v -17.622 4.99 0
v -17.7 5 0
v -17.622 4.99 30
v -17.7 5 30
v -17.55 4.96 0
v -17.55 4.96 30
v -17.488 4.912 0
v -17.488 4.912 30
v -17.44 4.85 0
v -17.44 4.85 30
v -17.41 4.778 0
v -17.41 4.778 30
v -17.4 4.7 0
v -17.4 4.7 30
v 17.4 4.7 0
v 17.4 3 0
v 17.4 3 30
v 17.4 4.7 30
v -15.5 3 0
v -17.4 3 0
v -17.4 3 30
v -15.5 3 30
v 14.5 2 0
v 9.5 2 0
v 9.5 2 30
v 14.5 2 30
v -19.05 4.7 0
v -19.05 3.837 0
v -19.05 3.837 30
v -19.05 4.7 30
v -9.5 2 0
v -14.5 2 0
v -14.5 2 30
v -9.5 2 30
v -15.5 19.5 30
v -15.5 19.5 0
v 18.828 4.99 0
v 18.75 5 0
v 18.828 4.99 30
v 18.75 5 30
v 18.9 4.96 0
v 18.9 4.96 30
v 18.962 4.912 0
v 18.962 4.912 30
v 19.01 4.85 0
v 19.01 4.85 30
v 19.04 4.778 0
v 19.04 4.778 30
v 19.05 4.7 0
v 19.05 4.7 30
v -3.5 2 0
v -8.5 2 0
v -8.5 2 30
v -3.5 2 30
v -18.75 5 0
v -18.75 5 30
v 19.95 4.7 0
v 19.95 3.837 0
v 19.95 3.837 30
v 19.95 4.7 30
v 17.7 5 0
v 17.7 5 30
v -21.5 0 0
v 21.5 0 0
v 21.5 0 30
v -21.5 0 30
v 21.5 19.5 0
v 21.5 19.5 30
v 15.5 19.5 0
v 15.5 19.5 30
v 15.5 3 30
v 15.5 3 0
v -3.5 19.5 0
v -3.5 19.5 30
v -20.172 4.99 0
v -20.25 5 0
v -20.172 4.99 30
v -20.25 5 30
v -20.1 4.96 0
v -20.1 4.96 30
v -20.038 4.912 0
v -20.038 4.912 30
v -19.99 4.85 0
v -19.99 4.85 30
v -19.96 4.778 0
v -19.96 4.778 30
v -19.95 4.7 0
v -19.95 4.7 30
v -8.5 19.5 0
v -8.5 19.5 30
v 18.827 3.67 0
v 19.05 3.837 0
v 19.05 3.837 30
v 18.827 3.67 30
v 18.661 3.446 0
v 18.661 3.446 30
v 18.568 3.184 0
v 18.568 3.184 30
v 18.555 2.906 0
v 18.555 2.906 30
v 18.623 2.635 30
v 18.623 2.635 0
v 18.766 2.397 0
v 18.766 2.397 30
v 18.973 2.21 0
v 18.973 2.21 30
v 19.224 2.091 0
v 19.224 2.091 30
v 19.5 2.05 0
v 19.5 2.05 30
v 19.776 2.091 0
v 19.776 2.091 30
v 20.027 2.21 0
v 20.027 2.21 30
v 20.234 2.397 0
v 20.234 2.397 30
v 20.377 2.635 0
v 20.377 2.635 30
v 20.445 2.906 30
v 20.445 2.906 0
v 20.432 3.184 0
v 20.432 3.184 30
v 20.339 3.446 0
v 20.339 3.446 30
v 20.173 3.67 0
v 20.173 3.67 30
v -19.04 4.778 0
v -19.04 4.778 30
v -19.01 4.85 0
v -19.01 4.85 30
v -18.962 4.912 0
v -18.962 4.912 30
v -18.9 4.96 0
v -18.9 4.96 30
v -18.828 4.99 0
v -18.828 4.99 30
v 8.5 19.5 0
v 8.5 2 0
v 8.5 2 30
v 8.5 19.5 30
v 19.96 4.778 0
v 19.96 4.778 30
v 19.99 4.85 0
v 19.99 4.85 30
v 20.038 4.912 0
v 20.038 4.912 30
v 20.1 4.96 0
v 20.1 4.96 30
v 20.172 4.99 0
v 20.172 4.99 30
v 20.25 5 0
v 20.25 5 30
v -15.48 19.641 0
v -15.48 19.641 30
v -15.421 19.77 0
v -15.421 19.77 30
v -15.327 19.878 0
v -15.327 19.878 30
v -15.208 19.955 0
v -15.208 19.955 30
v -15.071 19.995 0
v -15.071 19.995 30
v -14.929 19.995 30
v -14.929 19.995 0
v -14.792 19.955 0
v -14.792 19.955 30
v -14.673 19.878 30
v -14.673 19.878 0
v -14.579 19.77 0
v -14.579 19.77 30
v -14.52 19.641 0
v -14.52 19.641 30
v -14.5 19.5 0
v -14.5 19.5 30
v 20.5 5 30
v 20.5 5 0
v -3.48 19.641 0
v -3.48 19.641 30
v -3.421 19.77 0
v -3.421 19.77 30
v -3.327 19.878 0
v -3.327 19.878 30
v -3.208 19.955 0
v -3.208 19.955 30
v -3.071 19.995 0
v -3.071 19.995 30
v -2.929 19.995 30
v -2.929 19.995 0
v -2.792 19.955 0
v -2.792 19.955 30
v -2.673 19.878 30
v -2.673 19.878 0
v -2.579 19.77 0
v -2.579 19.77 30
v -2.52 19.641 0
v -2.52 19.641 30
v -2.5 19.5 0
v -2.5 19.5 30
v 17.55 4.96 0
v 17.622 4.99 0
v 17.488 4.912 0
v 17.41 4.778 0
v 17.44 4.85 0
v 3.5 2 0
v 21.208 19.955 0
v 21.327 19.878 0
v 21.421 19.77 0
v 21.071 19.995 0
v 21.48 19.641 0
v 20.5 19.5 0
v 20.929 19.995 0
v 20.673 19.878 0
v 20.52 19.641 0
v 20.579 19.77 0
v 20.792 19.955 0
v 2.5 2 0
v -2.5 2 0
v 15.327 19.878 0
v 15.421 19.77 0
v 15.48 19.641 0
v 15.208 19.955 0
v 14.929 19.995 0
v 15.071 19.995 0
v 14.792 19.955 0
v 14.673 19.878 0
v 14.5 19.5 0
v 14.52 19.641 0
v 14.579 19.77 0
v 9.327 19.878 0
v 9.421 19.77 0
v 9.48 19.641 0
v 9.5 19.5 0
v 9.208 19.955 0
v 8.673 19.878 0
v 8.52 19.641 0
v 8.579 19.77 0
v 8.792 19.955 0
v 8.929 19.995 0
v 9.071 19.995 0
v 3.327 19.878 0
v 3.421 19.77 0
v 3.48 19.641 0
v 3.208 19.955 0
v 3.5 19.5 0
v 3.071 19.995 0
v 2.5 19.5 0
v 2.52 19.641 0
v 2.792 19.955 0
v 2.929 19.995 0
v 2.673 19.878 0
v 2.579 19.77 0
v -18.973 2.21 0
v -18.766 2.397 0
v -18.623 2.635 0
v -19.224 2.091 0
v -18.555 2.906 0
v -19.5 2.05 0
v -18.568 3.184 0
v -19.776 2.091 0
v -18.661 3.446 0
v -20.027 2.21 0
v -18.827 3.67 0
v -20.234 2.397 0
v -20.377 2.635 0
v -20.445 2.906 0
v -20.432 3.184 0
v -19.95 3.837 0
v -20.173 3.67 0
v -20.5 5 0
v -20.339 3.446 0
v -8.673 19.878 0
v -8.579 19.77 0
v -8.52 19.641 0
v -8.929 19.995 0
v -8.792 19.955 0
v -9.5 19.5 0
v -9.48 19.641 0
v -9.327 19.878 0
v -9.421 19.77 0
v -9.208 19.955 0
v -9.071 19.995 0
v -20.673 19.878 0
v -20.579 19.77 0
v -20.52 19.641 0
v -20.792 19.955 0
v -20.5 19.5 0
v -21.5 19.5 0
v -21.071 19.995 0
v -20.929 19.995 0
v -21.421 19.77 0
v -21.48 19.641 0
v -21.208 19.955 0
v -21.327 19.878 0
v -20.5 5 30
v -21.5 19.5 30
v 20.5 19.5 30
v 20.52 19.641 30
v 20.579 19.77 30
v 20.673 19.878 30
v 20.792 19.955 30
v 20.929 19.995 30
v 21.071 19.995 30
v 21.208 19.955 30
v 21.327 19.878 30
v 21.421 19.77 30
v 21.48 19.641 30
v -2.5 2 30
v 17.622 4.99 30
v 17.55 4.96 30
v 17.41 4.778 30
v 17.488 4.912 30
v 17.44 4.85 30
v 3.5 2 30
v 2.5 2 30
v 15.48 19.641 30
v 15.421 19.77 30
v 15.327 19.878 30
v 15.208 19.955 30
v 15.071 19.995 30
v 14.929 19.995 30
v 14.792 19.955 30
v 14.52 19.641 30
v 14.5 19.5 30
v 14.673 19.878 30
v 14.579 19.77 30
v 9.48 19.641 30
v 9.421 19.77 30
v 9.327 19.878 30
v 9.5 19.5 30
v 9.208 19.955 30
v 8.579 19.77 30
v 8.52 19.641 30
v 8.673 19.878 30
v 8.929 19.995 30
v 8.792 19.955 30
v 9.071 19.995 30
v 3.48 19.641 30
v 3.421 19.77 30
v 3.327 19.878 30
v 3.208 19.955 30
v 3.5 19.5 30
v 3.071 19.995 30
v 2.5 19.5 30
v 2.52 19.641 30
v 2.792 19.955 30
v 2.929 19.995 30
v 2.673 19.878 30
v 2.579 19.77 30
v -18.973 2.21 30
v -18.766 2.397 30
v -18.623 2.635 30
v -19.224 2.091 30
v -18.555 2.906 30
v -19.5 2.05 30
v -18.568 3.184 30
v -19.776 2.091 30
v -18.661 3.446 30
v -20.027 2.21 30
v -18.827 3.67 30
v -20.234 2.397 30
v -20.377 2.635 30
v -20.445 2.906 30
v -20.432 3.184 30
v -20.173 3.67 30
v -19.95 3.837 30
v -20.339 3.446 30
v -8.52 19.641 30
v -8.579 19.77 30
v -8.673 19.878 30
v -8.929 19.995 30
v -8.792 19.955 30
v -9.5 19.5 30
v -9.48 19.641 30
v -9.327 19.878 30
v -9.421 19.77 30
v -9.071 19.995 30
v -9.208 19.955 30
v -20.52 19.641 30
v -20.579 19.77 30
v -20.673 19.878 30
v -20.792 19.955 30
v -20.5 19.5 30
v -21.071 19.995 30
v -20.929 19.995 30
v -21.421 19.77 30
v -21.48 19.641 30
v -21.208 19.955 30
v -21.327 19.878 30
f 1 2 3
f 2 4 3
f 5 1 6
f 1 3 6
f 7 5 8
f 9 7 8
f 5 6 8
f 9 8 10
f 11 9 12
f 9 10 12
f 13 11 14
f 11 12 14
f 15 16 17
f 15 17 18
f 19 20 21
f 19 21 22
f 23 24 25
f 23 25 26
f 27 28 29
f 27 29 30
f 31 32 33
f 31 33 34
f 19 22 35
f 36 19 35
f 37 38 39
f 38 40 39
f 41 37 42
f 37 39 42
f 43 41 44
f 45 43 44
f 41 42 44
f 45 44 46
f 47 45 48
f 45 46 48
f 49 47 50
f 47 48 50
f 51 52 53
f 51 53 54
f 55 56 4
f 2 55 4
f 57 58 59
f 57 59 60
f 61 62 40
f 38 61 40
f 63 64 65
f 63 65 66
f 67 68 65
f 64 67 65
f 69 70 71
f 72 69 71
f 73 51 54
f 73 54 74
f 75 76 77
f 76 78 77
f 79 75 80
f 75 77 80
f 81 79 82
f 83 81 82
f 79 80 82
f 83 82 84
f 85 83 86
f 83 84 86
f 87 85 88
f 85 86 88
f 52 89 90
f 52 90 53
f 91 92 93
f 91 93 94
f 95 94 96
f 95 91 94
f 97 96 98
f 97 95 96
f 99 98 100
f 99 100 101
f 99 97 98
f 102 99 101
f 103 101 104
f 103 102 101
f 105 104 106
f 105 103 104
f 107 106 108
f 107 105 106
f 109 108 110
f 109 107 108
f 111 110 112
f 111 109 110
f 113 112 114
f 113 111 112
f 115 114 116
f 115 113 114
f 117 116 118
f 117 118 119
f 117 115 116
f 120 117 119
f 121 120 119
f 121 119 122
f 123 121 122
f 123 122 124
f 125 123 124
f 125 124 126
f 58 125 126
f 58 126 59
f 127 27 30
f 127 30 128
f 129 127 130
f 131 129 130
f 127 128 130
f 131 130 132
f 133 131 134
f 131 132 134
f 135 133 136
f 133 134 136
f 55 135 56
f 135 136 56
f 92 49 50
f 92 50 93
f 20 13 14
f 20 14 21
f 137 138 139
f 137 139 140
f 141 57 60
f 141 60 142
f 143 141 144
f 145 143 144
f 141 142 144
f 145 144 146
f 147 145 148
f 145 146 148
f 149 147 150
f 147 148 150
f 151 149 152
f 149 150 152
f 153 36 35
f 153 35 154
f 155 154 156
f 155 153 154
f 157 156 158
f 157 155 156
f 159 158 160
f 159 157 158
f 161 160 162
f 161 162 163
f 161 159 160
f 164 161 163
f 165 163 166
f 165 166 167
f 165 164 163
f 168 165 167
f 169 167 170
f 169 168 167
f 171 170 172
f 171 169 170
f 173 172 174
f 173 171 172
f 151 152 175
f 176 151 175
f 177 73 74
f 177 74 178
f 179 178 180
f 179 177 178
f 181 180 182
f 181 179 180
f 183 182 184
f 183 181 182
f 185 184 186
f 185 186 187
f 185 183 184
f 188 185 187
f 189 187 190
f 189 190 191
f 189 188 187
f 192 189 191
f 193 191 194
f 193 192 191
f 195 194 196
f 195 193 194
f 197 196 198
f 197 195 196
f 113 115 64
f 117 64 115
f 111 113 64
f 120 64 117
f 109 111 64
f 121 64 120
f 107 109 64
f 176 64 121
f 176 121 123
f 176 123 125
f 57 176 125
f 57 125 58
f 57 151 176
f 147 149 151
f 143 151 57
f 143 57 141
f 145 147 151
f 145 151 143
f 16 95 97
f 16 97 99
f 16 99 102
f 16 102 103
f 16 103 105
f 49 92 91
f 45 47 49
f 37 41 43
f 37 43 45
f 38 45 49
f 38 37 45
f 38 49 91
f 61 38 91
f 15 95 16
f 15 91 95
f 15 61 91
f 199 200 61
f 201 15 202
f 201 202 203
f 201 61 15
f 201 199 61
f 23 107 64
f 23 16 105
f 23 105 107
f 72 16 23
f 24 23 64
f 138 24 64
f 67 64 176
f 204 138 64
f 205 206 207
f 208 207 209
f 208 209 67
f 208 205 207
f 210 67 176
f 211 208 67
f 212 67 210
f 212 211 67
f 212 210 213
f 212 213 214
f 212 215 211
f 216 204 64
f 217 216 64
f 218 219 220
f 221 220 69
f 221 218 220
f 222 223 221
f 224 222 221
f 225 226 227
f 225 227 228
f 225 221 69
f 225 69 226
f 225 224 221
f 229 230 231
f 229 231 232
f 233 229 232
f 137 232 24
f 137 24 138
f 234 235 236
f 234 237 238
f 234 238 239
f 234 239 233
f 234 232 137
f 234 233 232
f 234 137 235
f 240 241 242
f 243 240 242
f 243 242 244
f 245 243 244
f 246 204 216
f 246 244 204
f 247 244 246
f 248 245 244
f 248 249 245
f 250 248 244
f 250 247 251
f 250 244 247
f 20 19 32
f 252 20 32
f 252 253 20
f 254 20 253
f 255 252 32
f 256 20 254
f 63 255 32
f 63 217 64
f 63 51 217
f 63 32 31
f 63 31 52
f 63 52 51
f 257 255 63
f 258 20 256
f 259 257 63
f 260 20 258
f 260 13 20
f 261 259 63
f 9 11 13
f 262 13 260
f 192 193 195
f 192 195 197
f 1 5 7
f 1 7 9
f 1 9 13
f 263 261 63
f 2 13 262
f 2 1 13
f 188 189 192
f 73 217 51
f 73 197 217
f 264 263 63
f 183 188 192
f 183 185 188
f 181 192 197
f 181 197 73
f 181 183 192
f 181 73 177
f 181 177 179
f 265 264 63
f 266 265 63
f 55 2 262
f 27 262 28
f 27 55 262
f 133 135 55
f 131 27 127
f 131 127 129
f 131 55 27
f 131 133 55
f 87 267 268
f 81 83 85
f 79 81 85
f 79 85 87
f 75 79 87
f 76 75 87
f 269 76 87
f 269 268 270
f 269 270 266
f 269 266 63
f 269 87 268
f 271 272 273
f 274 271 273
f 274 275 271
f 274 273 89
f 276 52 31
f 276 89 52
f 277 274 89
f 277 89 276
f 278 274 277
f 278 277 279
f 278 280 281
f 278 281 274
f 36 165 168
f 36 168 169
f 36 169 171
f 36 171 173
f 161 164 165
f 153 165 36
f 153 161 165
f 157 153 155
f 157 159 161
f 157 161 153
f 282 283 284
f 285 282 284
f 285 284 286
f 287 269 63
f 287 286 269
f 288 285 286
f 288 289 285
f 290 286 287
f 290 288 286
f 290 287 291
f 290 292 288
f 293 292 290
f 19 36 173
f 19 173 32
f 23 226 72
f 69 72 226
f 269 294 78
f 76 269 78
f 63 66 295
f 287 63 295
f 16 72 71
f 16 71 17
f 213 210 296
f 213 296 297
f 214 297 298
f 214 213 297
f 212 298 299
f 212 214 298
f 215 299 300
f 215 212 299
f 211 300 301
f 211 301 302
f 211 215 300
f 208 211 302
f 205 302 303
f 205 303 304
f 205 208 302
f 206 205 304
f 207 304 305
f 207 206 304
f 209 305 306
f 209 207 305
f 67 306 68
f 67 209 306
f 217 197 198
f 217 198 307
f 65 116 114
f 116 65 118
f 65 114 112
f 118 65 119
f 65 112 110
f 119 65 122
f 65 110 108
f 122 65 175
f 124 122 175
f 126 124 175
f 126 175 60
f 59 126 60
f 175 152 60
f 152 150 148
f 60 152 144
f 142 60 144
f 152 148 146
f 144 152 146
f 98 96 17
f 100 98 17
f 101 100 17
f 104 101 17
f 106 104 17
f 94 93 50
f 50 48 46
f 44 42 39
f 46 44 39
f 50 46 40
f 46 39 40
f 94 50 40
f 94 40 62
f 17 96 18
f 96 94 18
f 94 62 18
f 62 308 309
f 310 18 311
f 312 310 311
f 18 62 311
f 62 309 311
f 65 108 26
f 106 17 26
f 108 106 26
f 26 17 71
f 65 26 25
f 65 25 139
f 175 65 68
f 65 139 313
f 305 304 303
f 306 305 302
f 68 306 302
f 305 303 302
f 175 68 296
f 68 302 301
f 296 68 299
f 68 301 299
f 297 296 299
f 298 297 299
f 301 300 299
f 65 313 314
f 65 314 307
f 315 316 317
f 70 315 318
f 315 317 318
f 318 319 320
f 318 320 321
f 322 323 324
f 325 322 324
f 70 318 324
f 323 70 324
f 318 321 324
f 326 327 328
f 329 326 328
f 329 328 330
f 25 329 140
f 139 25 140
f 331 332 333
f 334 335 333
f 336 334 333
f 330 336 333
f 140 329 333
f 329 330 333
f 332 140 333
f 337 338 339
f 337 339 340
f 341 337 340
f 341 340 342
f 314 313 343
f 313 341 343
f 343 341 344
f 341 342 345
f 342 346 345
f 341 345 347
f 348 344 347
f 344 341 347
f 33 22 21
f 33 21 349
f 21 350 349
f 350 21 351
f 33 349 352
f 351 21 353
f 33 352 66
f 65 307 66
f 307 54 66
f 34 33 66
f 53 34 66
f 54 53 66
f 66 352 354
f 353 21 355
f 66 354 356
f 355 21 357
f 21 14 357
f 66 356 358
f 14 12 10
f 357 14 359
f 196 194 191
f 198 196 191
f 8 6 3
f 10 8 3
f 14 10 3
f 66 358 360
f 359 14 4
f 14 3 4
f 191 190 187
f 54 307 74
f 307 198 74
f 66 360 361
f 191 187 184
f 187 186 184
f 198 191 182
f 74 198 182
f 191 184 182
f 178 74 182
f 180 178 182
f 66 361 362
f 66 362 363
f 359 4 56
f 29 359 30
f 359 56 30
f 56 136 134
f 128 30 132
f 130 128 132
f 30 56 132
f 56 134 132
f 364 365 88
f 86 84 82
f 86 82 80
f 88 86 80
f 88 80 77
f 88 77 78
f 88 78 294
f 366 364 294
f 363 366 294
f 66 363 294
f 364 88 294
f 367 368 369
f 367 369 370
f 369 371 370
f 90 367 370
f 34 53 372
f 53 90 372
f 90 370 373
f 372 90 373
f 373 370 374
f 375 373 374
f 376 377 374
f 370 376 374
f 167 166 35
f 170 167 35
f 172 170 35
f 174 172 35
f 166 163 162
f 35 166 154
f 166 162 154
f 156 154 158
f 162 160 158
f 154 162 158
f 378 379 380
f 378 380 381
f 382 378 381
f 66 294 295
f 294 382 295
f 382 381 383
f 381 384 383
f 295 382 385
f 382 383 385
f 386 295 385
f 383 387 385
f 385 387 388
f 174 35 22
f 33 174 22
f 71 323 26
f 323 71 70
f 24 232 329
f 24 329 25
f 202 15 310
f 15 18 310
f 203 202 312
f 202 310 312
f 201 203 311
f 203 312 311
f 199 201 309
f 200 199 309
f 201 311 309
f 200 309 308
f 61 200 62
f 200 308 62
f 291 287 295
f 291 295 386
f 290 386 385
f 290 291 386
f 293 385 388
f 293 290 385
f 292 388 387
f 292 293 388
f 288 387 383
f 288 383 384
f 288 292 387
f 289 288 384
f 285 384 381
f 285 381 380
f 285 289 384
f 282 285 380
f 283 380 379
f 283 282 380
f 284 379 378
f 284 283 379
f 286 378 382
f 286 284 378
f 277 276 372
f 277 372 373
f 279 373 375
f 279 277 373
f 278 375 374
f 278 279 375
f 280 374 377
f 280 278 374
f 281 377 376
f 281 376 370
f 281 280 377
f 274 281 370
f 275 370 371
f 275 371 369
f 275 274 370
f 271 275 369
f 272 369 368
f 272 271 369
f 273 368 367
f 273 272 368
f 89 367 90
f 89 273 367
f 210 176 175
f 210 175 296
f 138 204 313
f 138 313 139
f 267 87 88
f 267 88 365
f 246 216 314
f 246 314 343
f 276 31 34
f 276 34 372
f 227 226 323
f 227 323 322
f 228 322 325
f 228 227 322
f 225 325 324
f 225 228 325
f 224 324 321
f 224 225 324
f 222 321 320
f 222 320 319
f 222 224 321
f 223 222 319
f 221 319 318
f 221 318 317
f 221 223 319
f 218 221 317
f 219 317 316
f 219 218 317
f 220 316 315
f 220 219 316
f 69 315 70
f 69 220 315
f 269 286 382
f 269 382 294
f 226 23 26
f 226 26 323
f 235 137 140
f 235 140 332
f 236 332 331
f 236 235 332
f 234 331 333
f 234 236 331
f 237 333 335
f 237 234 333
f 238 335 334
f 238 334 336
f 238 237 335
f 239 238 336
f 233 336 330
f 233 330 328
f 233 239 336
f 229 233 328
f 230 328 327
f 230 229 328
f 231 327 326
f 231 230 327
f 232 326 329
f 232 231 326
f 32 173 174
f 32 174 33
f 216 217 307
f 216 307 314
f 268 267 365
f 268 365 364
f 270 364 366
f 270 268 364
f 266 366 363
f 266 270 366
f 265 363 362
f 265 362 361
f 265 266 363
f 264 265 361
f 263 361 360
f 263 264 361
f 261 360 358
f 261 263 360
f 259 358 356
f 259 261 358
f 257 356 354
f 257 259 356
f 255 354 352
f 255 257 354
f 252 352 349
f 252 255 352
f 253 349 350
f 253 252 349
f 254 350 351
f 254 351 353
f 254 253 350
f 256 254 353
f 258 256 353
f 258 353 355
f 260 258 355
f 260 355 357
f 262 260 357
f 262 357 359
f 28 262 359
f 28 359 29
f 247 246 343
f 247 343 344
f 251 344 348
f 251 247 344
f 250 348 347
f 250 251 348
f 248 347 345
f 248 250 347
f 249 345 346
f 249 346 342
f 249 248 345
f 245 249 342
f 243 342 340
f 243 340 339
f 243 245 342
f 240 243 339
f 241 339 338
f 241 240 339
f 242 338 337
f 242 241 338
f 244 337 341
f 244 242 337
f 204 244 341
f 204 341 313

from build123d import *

# Parameters (mm, degrees)
EXTRUDE_1_DEPTH = 30
FILLET_1_R      = 0.3


with BuildPart() as part:
    # Эскиз1 → Бобышка-Вытянуть1 (new body)
    with BuildSketch(Plane.XY):
        with BuildLine():
            Line((21.5, 0), (-21.5, 0))
            Line((-21.5, 0), (-21.5, 19.5))
            ThreePointArc((-21.5, 19.5), (-21, 20), (-20.5, 19.5))
            Line((-20.5, 19.5), (-20.5, 5))
            Line((-20.5, 5), (-19.95, 5))
            Line((-19.95, 5), (-19.95, 3.836660027))
            ThreePointArc((-19.95, 3.836660027), (-19.5, 2.05), (-19.05, 3.836660027))
            Line((-19.05, 3.836660027), (-19.05, 5))
            Line((-19.05, 5), (-17.4, 5))
            Line((-17.4, 5), (-17.4, 3))
            Line((-17.4, 3), (-15.5, 3))
            Line((-15.5, 3), (-15.5, 19.5))
            ThreePointArc((-15.5, 19.5), (-15, 20), (-14.5, 19.5))
            Line((-14.5, 19.5), (-14.5, 2))
            Line((-14.5, 2), (-9.5, 2))
            Line((-9.5, 2), (-9.5, 19.5))
            ThreePointArc((-9.5, 19.5), (-9, 20), (-8.5, 19.5))
            Line((-8.5, 19.5), (-8.5, 2))
            Line((-8.5, 2), (-3.5, 2))
            Line((-3.5, 2), (-3.5, 19.5))
            ThreePointArc((-3.5, 19.5), (-3, 20), (-2.5, 19.5))
            Line((-2.5, 19.5), (-2.5, 2))
            Line((-2.5, 2), (2.5, 2))
            Line((2.5, 2), (2.5, 19.5))
            ThreePointArc((2.5, 19.5), (3, 20), (3.5, 19.5))
            Line((3.5, 19.5), (3.5, 2))
            Line((3.5, 2), (8.5, 2))
            Line((8.5, 2), (8.5, 19.5))
            ThreePointArc((8.5, 19.5), (9, 20), (9.5, 19.5))
            Line((9.5, 19.5), (9.5, 2))
            Line((9.5, 2), (14.5, 2))
            Line((14.5, 2), (14.5, 19.5))
            ThreePointArc((14.5, 19.5), (15, 20), (15.5, 19.5))
            Line((15.5, 19.5), (15.5, 3))
            Line((15.5, 3), (17.4, 3))
            Line((17.4, 3), (17.4, 5))
            Line((17.4, 5), (19.05, 5))
            Line((19.05, 5), (19.05, 3.836660027))
            ThreePointArc((19.05, 3.836660027), (19.5, 2.05), (19.95, 3.836660027))
            Line((19.95, 3.836660027), (19.95, 5))
            Line((19.95, 5), (20.5, 5))
            Line((20.5, 5), (20.5, 19.5))
            ThreePointArc((20.5, 19.5), (21, 20), (21.5, 19.5))
            Line((21.5, 19.5), (21.5, 0))
        make_face()
    extrude(amount=EXTRUDE_1_DEPTH)

    # Скругление1
    fillet_1_edges = [part.edges().sort_by_distance(p)[0] for p in [
        (-19.95, 5, 15),
        (-19.05, 5, 15),
        (-17.4, 5, 15),
        (17.4, 5, 15),
        (19.05, 5, 15),
        (19.95, 5, 15),
    ]]
    fillet(fillet_1_edges, radius=FILLET_1_R)


solid = part.part
